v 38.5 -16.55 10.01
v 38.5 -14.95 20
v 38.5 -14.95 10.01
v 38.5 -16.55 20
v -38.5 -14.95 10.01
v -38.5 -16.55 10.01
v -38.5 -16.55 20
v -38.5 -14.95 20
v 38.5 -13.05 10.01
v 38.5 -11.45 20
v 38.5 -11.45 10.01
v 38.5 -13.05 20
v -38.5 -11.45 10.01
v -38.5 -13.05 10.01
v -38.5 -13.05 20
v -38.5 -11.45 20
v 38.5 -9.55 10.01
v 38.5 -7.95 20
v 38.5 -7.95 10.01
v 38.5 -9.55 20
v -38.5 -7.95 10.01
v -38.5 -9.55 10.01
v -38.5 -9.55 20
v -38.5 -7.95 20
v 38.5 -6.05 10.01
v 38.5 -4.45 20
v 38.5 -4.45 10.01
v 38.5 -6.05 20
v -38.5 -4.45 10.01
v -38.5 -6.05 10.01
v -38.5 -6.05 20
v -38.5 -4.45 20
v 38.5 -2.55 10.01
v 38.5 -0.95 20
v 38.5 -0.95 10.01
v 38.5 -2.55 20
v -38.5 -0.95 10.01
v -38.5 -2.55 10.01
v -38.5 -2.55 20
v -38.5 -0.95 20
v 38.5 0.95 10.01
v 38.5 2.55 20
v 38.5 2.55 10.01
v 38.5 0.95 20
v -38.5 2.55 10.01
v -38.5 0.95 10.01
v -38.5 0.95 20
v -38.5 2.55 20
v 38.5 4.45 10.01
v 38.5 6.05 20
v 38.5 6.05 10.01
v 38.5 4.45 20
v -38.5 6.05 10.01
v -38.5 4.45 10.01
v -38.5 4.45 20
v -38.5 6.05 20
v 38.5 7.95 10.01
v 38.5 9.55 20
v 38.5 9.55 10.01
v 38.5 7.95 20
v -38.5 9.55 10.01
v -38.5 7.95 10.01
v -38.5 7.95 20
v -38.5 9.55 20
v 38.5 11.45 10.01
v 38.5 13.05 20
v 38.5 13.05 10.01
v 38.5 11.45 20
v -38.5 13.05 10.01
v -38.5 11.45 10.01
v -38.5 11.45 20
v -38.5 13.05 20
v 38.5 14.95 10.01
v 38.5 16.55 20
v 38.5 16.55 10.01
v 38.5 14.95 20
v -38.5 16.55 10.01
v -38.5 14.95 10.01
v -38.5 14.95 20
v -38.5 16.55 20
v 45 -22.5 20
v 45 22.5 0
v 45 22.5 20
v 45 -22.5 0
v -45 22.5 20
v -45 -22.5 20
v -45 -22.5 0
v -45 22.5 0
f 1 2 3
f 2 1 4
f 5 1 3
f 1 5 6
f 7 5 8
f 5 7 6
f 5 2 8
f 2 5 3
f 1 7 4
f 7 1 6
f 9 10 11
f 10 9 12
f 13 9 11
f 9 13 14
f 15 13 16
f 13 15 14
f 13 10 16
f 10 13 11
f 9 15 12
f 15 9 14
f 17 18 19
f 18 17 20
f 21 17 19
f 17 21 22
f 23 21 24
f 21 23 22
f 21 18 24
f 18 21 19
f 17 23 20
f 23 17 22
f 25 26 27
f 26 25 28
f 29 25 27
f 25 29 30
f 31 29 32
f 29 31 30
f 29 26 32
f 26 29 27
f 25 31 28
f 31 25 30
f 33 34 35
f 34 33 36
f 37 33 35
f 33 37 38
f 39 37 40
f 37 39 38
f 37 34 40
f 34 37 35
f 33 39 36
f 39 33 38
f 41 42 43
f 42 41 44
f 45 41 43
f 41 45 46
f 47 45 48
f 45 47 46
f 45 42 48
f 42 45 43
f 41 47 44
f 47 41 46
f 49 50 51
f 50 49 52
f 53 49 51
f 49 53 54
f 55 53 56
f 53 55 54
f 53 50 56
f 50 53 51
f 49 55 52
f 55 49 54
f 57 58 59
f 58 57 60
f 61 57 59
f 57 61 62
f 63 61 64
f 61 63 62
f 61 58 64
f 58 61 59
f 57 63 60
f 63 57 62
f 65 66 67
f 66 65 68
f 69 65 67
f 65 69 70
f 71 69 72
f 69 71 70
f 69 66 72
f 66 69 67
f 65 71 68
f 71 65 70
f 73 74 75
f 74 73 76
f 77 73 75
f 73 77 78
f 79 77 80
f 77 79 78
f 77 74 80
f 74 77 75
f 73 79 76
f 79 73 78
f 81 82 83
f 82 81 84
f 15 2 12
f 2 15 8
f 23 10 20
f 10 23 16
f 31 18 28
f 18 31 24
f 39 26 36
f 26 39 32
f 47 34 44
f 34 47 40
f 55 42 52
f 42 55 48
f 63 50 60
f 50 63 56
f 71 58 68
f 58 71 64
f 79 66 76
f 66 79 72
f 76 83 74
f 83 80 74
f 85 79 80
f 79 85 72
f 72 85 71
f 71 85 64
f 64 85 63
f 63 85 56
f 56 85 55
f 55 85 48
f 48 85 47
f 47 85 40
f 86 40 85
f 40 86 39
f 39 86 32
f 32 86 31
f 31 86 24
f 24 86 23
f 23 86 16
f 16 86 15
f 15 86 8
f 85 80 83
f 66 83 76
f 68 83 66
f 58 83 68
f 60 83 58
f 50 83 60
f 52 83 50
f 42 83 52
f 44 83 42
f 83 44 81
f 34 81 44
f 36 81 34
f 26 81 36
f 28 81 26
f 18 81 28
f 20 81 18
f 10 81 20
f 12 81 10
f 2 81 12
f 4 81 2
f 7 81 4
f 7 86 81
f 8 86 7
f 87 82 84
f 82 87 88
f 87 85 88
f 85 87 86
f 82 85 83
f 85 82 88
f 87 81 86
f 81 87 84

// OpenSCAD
// Microscope Slide Drying Rack
// Designed for 10 slides (75x25x1mm) standing on long edge.

// Block dimensions
L_block = 90.0;    // Length (X)
W_block = 45.0;    // Width (Y)
H_block = 20.0;    // Height (Z)

// Slot dimensions
L_slot = 77.0;     // Slot length (X)
W_slot = 1.6;      // Slot width (Y)
D_slot = 10.0;     // Slot depth (Z)
P_slot = 3.5;      // Slot pitch (center-to-center in Y)
N_slots = 10;      // Number of slots

$fn = 64;

// Calculate the starting Y position to center the group of slots
// The centers of the slots are at: -(N-1)/2 * P to +(N-1)/2 * P
y_offset = (N_slots - 1) * P_slot / 2;

difference() {
    // The main base block
    translate([-L_block/2, -W_block/2, 0])
        cube([L_block, W_block, H_block]);

    // The 10 parallel slots
    for (i = [0 : N_slots - 1]) {
        // Calculate Y position for current slot center
        y_pos = (i * P_slot) - y_offset;
        
        // Translate to position the slot
        // We subtract L_slot/2 to center it on X
        // We subtract W_slot/2 to center it on Y
        // We use -0.01 for Z to ensure a clean cut through the top face
        translate([-L_slot/2, y_pos - W_slot/2, H_block - D_slot + 0.01])
            cube([L_slot, W_slot, D_slot + 0.01]);
    }
}
